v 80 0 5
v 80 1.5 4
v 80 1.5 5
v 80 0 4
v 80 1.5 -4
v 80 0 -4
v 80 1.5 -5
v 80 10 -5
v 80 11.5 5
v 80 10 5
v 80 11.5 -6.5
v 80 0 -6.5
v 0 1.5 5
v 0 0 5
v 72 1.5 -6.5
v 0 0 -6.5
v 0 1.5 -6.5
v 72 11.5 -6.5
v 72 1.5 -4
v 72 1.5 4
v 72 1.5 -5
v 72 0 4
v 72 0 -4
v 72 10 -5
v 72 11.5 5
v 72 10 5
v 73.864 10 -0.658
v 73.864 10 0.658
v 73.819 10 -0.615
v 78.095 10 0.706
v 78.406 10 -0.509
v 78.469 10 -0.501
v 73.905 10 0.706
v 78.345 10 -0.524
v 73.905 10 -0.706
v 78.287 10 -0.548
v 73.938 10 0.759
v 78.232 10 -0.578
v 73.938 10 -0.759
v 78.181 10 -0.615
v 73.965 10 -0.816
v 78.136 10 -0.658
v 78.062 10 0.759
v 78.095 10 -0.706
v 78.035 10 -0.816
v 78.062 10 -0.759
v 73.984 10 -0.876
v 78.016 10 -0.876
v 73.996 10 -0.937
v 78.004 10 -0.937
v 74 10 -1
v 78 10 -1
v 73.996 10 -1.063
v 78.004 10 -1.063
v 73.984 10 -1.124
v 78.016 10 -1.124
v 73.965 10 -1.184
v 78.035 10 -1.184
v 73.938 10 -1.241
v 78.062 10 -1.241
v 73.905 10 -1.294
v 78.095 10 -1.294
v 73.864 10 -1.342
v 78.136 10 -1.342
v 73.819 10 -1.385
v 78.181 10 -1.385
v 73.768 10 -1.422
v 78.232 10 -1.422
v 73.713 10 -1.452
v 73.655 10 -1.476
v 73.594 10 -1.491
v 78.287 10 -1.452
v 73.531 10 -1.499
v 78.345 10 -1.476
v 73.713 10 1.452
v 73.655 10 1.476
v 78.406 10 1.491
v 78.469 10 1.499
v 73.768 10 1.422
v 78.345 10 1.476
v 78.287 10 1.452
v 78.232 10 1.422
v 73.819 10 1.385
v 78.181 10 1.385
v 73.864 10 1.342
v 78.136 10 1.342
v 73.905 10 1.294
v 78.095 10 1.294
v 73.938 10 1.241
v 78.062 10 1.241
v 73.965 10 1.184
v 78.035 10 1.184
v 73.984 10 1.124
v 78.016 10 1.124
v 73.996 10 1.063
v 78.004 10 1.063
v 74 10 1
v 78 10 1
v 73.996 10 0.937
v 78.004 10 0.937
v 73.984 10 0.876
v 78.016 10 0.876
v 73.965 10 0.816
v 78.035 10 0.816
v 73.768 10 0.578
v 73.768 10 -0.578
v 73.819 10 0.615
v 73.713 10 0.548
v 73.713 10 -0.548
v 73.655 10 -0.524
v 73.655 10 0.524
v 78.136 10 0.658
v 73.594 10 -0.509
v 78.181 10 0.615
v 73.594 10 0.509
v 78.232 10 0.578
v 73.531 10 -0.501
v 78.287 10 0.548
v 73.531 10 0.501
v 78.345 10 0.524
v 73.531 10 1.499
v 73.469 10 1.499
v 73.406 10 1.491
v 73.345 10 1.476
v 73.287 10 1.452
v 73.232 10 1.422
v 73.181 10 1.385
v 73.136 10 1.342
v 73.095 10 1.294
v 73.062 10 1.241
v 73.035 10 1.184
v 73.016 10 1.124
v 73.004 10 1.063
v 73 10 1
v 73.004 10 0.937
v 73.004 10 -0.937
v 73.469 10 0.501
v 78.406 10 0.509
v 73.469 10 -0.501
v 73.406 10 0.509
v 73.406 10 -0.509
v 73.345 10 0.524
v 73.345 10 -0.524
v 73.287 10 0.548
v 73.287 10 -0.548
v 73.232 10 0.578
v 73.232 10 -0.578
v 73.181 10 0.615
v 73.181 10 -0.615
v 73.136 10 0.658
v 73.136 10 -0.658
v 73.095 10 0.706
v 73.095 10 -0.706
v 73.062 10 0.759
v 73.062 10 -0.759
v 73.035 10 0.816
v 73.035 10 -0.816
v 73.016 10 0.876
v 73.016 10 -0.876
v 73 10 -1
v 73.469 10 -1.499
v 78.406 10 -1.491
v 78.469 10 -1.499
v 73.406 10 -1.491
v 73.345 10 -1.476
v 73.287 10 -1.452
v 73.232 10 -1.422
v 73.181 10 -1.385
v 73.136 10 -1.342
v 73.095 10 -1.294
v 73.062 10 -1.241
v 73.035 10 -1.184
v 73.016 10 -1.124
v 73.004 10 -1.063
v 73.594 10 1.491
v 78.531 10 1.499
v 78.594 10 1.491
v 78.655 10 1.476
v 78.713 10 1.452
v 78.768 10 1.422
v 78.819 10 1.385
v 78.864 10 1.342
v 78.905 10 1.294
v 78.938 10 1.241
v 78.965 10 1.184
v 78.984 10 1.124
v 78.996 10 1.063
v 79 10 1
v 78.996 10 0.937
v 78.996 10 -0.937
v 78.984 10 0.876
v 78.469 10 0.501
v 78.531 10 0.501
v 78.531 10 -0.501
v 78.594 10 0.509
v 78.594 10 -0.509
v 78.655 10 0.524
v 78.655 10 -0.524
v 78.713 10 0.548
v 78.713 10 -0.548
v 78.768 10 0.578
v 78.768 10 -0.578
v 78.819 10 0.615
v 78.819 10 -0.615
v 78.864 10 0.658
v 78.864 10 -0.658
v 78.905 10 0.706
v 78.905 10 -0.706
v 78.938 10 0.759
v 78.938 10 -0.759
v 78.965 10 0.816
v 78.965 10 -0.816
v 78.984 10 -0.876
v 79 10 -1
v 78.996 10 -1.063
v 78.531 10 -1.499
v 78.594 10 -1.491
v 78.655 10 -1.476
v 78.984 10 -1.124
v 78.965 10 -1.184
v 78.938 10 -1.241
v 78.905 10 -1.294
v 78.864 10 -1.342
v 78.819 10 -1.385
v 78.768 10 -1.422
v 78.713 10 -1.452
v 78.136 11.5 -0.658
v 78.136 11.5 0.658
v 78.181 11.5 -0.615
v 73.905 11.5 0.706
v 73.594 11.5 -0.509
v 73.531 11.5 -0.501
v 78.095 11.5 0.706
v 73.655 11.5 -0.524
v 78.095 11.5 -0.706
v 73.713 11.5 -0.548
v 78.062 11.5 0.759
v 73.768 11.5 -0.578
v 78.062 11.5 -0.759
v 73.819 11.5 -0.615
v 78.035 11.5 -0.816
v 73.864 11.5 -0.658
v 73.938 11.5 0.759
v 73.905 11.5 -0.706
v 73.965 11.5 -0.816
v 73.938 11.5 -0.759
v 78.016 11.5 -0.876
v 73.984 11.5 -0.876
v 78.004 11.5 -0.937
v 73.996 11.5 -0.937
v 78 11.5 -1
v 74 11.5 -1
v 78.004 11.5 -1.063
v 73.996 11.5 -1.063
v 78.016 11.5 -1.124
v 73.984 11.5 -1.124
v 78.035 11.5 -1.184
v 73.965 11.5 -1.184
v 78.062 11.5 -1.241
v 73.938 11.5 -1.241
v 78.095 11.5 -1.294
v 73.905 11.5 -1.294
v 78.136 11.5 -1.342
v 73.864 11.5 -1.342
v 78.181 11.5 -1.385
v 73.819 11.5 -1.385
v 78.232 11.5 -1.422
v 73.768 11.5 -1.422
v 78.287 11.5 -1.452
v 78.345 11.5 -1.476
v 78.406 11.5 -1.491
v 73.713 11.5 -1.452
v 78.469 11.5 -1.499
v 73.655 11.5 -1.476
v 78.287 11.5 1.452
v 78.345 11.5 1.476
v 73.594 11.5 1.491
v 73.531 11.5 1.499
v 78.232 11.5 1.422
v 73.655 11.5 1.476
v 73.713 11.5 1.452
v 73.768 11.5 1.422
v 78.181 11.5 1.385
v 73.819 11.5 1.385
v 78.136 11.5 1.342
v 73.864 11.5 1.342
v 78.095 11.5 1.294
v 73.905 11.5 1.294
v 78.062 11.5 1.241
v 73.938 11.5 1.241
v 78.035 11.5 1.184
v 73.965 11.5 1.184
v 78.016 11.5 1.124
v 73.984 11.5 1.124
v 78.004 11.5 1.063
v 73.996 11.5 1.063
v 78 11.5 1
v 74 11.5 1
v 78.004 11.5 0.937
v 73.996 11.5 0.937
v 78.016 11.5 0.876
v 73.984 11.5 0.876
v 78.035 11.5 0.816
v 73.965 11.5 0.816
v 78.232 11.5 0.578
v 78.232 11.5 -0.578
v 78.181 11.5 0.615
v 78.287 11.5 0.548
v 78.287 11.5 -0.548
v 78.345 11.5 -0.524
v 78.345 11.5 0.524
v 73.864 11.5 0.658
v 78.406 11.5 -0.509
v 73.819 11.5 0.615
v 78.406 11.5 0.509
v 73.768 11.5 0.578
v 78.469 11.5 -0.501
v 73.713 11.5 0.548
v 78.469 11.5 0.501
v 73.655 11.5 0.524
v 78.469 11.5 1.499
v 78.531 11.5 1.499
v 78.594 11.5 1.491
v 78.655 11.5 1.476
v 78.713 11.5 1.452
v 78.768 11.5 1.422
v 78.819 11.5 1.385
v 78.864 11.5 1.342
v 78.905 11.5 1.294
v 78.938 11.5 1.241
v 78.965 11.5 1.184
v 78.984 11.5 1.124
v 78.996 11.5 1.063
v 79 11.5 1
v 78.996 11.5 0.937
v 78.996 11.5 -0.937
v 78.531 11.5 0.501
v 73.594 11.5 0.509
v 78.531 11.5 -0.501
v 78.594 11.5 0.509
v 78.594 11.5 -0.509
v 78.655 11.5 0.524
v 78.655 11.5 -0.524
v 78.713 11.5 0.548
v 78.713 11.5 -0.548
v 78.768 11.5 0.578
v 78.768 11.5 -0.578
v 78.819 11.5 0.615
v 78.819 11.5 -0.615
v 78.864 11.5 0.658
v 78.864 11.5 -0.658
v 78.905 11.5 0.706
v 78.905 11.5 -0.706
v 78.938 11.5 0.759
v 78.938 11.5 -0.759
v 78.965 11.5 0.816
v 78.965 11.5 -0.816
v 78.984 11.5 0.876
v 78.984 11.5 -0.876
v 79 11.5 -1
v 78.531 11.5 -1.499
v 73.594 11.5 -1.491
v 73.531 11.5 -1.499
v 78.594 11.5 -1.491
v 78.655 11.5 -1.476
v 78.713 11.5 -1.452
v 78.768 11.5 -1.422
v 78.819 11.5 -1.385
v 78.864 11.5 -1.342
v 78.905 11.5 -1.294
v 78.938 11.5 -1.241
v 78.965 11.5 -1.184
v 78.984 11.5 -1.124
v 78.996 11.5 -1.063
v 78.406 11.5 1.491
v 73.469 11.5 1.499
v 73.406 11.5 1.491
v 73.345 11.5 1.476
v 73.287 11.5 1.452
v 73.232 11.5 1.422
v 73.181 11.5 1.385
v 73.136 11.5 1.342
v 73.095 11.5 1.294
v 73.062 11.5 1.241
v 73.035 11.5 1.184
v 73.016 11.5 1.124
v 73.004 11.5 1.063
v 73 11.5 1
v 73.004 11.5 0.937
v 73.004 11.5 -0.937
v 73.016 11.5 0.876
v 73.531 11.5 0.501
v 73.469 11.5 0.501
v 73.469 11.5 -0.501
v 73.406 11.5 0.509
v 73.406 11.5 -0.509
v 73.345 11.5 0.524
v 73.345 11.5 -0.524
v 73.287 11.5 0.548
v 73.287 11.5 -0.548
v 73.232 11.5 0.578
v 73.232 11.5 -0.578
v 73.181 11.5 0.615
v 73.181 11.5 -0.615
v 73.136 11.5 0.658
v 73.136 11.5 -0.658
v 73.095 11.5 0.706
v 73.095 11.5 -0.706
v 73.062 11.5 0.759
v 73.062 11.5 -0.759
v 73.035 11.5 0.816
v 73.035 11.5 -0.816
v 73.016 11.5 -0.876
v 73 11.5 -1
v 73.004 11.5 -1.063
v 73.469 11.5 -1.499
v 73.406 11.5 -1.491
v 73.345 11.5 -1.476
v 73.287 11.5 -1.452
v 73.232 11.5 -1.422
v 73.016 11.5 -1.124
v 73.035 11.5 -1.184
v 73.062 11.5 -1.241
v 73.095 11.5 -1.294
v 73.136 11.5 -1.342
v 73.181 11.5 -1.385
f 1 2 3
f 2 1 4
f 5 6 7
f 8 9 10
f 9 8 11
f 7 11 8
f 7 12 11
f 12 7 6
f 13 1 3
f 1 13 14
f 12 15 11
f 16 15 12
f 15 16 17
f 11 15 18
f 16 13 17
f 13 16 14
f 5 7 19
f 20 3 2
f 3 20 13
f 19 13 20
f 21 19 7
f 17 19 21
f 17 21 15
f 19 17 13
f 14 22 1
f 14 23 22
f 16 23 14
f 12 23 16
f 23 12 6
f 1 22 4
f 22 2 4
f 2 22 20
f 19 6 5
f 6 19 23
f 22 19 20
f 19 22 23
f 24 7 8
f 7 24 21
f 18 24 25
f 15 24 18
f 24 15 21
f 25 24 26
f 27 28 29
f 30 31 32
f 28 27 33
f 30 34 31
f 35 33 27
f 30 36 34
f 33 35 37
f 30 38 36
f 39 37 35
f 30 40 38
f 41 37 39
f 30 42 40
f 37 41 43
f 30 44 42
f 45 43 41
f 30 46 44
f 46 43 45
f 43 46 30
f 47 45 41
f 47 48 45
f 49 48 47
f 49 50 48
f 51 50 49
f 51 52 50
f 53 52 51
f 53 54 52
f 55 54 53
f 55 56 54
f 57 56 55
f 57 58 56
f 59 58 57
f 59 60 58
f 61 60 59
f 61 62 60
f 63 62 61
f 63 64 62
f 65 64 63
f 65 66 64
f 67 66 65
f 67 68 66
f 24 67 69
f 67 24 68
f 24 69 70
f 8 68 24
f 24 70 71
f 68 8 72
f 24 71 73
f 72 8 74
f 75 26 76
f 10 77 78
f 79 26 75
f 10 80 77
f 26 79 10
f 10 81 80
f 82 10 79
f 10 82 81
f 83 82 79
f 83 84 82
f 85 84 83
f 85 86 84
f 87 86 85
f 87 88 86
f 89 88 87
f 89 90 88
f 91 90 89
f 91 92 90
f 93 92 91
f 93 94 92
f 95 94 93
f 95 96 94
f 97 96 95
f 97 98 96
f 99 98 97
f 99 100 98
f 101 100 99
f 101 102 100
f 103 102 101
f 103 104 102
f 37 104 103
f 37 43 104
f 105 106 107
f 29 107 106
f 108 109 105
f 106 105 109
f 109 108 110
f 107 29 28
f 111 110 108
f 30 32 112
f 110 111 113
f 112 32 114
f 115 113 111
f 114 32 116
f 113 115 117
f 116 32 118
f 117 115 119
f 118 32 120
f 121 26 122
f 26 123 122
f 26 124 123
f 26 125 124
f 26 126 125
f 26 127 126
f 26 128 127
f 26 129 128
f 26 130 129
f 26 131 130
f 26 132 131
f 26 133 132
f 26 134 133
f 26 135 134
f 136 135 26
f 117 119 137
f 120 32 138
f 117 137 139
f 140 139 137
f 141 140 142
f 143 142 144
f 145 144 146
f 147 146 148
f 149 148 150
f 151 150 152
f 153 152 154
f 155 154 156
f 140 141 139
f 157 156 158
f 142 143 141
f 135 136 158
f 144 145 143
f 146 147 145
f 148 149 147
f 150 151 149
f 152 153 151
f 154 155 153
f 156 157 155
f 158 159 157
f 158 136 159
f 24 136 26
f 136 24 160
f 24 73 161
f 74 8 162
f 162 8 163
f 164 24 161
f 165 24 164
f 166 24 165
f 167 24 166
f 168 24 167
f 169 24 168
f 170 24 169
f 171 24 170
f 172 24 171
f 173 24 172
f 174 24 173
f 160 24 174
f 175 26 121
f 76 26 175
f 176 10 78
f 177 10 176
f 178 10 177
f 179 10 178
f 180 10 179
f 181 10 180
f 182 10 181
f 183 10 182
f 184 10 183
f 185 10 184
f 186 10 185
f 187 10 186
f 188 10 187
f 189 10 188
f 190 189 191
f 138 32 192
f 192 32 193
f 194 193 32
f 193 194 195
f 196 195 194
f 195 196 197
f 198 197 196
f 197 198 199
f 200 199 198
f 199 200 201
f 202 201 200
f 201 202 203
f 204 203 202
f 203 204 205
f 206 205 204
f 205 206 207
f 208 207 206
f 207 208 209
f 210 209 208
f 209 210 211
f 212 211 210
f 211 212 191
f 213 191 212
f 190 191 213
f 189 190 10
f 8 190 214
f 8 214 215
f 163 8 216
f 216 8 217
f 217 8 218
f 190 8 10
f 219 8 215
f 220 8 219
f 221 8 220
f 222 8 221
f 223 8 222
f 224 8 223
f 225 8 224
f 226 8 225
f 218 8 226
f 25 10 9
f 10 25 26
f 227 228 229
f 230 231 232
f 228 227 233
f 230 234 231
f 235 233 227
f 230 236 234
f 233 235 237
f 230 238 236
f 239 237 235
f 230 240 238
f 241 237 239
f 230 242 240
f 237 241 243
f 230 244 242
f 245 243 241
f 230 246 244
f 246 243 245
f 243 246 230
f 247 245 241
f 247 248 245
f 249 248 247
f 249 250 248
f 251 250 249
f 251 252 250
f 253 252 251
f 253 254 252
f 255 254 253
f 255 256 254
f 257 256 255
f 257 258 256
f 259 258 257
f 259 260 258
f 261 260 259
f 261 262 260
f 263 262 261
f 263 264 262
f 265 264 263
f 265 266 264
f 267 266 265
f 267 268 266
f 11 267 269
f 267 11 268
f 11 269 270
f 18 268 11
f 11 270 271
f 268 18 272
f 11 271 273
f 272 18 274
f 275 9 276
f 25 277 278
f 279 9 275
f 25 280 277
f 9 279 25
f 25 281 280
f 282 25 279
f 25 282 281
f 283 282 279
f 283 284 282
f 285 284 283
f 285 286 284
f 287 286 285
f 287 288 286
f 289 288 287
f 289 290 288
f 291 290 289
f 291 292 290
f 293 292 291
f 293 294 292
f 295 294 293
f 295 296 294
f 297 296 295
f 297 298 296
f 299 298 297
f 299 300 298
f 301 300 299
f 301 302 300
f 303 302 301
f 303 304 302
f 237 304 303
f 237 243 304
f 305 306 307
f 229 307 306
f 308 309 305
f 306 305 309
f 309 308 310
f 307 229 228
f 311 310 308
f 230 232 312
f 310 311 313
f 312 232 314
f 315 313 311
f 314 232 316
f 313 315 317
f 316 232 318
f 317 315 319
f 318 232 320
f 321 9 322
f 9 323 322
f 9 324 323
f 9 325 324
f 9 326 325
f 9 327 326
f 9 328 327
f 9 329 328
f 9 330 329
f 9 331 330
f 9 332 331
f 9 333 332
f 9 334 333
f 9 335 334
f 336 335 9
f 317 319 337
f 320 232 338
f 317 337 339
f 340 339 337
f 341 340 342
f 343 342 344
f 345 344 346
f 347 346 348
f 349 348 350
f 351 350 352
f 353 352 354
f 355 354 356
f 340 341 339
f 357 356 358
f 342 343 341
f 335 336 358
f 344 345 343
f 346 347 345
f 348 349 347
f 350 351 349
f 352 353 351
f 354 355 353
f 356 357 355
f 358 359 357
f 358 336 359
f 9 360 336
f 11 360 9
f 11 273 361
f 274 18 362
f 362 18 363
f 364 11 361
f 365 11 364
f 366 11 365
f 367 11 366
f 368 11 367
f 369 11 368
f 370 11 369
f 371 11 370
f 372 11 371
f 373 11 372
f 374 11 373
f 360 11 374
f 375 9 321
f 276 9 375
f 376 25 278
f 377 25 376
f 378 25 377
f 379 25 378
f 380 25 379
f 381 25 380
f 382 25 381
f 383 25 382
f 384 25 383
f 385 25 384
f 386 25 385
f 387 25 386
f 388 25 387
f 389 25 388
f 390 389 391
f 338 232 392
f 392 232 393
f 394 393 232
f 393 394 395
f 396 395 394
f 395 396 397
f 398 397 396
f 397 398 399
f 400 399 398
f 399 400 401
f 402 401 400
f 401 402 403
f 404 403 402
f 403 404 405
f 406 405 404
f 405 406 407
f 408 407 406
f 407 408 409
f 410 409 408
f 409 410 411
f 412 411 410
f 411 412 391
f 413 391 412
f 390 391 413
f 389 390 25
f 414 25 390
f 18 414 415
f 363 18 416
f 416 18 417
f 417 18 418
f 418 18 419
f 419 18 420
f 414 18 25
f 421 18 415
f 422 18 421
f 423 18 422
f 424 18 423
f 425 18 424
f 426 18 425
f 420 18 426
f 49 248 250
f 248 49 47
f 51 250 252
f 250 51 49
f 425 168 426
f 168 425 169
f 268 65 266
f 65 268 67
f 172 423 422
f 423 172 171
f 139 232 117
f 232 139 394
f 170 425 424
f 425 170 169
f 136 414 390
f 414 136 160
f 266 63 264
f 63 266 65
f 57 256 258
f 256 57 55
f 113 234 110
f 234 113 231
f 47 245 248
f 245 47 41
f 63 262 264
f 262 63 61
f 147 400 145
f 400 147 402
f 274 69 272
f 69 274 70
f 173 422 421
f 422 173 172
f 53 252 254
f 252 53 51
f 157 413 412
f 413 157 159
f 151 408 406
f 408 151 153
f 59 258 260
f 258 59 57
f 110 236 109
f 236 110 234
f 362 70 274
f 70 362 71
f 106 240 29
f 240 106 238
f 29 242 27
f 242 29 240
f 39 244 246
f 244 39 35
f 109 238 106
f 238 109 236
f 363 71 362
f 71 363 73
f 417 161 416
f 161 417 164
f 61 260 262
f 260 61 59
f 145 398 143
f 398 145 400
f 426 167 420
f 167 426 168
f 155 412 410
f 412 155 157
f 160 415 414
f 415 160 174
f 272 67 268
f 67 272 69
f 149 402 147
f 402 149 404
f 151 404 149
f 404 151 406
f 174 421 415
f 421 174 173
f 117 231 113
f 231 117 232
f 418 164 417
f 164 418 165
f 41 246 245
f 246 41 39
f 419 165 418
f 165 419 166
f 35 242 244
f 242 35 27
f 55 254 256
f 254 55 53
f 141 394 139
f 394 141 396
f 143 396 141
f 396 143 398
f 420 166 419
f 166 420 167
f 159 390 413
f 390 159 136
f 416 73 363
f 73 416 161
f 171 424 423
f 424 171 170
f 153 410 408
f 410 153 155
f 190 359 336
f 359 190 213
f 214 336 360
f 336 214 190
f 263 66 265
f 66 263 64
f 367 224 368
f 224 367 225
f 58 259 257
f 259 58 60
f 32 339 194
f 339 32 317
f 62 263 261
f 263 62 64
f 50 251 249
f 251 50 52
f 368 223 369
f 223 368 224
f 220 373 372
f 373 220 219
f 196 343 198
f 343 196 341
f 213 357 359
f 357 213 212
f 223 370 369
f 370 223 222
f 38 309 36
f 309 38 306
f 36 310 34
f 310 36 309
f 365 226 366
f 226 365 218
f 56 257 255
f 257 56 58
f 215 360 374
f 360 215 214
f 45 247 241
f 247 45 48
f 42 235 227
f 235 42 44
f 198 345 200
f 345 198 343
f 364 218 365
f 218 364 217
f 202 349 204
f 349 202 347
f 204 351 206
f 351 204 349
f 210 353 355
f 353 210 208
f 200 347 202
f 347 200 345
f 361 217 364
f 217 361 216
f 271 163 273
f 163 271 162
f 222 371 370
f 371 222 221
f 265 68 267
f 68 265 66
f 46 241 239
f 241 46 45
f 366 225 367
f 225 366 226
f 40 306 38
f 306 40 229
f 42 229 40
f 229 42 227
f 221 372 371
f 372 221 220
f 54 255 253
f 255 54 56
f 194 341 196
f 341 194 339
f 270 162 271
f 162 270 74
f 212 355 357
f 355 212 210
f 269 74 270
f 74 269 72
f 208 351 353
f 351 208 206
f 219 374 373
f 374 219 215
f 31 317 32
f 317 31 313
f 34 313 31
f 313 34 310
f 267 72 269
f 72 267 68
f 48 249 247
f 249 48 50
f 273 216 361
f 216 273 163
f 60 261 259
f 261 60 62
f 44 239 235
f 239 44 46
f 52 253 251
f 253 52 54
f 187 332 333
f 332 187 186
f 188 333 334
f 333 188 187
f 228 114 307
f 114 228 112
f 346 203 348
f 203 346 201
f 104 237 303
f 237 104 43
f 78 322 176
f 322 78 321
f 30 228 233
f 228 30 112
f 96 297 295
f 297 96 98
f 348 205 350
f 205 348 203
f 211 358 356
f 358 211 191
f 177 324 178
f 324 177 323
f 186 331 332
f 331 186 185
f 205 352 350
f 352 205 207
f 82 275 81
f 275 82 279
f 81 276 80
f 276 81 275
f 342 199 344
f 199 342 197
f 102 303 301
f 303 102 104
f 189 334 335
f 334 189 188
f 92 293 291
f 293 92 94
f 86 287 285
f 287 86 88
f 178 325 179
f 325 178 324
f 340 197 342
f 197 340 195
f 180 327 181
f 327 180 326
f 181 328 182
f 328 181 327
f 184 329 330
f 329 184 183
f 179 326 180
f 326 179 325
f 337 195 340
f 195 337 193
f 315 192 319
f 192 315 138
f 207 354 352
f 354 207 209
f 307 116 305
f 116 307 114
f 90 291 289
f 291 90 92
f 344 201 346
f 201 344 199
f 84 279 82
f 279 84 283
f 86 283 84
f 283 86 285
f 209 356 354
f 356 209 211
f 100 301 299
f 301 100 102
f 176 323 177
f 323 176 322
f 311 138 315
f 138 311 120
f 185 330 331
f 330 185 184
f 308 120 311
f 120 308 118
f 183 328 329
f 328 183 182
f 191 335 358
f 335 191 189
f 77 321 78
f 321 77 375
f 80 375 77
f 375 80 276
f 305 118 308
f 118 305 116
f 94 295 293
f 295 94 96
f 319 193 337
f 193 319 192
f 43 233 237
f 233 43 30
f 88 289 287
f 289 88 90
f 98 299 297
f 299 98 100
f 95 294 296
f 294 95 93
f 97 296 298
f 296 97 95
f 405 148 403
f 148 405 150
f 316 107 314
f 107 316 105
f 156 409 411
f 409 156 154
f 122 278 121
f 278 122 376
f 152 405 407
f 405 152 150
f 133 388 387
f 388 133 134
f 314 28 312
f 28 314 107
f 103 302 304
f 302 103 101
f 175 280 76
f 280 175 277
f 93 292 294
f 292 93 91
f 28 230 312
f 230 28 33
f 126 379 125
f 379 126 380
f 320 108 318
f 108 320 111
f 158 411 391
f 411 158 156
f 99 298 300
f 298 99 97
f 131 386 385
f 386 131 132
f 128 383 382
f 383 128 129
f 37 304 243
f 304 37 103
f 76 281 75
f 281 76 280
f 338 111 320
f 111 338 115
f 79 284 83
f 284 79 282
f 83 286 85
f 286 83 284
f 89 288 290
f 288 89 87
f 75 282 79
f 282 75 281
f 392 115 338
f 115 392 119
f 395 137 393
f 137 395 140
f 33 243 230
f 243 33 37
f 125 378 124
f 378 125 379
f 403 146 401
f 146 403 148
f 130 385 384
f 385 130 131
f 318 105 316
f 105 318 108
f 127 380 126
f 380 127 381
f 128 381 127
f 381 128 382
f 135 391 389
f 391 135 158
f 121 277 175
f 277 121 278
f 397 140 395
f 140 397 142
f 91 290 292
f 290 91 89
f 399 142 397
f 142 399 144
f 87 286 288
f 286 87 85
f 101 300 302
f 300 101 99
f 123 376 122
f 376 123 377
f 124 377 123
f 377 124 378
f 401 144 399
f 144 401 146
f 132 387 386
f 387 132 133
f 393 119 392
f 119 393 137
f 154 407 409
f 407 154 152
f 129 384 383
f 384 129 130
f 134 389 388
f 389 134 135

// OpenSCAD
pcb_size_z = 8;
pcb_size_x = 8;

tool_size_x = 80;
tool_size_y = 1.5;
tool_size_z = 10;

fork_size_x = pcb_size_x;

bridge_size_x = pcb_size_x;
bridge_size_y = 10;
bridge_size_z = tool_size_y;

top_size_x = bridge_size_x;
top_size_y = bridge_size_z;
top_size_z = tool_size_z;

// Offset of hole centers
hole_off_x = 1.5;
hole_off_z = 3;
hole_diameter = 1;

hole_centers = [
    [hole_off_x, 0, hole_off_z],
    [pcb_size_x - hole_off_x, 0, hole_off_z],
    [pcb_size_x - hole_off_x, 0, pcb_size_z - hole_off_z],
    [hole_off_x, 0, pcb_size_z - hole_off_z]
];
    

tool();

module tool()
{
    union() {
        fork();
        difference() {
            bridge();
            holes();
        }
    }
}

module fork()
{
    difference() {
        translate([0, 0, -tool_size_z / 2 - bridge_size_z]) {
            cube([tool_size_x, tool_size_y, tool_size_z + bridge_size_z]);
        }
        translate([tool_size_x - fork_size_x, 0, -pcb_size_z / 2]) {
            cube([fork_size_x, tool_size_y, pcb_size_z]);
        }
    }
}

module bridge()
{
    bridge_pos_x = tool_size_x - fork_size_x;
    bridge_pos_z = -tool_size_z / 2 - bridge_size_z;
    translate([bridge_pos_x, 0, bridge_pos_z]) {
        cube([bridge_size_x, bridge_size_y, bridge_size_z]);
    }
    top_pos_x = bridge_pos_x;
    top_pos_y = bridge_size_y;
    top_pos_z = bridge_pos_z;
    translate([top_pos_x, top_pos_y, top_pos_z]) {
        cube([top_size_x, top_size_y, top_size_z + top_size_y]);
    }
}

module holes()
{
    bridge_pos_x = tool_size_x - fork_size_x;
    bridge_pos_z = -tool_size_z / 2 - bridge_size_z;

    translate([bridge_pos_x, bridge_size_y + top_size_y, -pcb_size_z / 2]) {
        for (i = [0: 3]) {
            translate(hole_centers[i]) {
                rotate([90, 0, 0]) {
                    cylinder(top_size_y, d=hole_diameter, $fn=50);
                }
            }
        }
    }
}
